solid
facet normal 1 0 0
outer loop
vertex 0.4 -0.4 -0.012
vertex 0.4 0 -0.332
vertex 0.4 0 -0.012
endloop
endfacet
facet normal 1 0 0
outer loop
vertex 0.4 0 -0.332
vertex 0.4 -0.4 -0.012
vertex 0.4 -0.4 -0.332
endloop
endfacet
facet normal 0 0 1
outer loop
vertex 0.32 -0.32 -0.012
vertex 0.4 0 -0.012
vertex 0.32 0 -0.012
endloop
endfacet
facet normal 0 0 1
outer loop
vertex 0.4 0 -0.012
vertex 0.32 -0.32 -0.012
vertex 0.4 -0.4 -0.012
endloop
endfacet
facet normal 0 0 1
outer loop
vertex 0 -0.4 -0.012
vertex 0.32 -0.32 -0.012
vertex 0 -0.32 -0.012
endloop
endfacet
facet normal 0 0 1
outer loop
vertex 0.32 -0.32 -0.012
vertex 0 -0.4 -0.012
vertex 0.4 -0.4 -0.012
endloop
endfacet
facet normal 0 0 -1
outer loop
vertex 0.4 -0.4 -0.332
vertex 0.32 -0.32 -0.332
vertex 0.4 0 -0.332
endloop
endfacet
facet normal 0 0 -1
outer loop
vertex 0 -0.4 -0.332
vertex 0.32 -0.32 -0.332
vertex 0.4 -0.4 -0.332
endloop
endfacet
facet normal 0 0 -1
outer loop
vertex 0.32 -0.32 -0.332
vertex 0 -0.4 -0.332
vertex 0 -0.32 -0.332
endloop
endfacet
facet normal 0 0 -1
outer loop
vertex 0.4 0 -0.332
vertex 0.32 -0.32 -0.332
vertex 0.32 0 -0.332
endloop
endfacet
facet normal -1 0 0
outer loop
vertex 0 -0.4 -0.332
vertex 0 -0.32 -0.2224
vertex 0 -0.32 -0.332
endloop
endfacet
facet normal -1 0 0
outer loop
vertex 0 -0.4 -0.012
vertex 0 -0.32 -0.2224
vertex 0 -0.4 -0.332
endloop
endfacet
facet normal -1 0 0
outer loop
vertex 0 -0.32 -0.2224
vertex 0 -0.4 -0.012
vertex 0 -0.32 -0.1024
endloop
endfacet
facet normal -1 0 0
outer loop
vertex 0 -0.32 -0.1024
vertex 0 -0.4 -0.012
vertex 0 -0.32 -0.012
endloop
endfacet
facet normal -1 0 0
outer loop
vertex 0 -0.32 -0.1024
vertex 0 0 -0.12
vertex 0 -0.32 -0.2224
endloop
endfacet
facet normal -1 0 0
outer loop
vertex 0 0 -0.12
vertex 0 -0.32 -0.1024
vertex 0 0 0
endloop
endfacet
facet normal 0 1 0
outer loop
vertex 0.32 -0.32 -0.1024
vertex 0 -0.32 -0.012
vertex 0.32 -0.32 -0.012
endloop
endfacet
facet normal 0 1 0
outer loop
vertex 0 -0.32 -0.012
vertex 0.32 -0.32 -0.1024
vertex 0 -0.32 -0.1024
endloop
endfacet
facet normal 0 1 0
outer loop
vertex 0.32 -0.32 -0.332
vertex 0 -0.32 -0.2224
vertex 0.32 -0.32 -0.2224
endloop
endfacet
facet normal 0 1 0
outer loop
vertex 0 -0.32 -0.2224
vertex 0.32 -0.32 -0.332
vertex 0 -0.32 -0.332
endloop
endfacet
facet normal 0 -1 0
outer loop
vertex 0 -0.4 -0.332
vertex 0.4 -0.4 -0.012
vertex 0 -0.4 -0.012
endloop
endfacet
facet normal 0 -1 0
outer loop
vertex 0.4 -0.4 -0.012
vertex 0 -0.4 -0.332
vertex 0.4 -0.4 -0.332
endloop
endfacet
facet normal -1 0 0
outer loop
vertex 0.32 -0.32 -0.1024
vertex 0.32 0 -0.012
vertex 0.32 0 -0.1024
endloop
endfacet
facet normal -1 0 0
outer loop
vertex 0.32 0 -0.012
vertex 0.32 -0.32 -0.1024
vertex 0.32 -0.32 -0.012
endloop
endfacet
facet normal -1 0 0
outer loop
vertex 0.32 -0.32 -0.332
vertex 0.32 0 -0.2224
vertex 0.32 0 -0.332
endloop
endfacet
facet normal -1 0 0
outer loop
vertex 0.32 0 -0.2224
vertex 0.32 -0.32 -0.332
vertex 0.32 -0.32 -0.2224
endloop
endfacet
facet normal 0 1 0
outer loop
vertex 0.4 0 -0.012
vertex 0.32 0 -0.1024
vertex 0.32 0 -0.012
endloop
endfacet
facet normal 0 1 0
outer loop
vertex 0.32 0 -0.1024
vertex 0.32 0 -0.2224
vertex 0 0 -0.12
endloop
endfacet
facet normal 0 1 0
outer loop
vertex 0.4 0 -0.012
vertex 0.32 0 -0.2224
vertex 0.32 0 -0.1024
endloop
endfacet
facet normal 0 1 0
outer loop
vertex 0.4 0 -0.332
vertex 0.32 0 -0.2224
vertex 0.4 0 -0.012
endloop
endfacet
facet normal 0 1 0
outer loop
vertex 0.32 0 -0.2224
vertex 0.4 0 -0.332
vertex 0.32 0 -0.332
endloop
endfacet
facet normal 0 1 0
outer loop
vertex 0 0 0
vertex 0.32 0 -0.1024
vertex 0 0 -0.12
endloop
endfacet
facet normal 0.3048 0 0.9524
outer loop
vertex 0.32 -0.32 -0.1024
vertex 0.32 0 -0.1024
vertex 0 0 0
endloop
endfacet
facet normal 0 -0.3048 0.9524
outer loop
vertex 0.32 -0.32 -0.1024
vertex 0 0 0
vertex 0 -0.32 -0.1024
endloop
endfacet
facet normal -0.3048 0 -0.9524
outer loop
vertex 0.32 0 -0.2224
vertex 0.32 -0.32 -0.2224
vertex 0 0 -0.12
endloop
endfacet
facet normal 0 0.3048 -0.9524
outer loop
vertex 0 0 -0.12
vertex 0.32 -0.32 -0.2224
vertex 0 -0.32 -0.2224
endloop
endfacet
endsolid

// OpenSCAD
// Shed shell kit: eave corner. See lib/lodge_kit.scad.
include <lib/lodge_kit.scad>
kind = "shed";
eave_corner();
